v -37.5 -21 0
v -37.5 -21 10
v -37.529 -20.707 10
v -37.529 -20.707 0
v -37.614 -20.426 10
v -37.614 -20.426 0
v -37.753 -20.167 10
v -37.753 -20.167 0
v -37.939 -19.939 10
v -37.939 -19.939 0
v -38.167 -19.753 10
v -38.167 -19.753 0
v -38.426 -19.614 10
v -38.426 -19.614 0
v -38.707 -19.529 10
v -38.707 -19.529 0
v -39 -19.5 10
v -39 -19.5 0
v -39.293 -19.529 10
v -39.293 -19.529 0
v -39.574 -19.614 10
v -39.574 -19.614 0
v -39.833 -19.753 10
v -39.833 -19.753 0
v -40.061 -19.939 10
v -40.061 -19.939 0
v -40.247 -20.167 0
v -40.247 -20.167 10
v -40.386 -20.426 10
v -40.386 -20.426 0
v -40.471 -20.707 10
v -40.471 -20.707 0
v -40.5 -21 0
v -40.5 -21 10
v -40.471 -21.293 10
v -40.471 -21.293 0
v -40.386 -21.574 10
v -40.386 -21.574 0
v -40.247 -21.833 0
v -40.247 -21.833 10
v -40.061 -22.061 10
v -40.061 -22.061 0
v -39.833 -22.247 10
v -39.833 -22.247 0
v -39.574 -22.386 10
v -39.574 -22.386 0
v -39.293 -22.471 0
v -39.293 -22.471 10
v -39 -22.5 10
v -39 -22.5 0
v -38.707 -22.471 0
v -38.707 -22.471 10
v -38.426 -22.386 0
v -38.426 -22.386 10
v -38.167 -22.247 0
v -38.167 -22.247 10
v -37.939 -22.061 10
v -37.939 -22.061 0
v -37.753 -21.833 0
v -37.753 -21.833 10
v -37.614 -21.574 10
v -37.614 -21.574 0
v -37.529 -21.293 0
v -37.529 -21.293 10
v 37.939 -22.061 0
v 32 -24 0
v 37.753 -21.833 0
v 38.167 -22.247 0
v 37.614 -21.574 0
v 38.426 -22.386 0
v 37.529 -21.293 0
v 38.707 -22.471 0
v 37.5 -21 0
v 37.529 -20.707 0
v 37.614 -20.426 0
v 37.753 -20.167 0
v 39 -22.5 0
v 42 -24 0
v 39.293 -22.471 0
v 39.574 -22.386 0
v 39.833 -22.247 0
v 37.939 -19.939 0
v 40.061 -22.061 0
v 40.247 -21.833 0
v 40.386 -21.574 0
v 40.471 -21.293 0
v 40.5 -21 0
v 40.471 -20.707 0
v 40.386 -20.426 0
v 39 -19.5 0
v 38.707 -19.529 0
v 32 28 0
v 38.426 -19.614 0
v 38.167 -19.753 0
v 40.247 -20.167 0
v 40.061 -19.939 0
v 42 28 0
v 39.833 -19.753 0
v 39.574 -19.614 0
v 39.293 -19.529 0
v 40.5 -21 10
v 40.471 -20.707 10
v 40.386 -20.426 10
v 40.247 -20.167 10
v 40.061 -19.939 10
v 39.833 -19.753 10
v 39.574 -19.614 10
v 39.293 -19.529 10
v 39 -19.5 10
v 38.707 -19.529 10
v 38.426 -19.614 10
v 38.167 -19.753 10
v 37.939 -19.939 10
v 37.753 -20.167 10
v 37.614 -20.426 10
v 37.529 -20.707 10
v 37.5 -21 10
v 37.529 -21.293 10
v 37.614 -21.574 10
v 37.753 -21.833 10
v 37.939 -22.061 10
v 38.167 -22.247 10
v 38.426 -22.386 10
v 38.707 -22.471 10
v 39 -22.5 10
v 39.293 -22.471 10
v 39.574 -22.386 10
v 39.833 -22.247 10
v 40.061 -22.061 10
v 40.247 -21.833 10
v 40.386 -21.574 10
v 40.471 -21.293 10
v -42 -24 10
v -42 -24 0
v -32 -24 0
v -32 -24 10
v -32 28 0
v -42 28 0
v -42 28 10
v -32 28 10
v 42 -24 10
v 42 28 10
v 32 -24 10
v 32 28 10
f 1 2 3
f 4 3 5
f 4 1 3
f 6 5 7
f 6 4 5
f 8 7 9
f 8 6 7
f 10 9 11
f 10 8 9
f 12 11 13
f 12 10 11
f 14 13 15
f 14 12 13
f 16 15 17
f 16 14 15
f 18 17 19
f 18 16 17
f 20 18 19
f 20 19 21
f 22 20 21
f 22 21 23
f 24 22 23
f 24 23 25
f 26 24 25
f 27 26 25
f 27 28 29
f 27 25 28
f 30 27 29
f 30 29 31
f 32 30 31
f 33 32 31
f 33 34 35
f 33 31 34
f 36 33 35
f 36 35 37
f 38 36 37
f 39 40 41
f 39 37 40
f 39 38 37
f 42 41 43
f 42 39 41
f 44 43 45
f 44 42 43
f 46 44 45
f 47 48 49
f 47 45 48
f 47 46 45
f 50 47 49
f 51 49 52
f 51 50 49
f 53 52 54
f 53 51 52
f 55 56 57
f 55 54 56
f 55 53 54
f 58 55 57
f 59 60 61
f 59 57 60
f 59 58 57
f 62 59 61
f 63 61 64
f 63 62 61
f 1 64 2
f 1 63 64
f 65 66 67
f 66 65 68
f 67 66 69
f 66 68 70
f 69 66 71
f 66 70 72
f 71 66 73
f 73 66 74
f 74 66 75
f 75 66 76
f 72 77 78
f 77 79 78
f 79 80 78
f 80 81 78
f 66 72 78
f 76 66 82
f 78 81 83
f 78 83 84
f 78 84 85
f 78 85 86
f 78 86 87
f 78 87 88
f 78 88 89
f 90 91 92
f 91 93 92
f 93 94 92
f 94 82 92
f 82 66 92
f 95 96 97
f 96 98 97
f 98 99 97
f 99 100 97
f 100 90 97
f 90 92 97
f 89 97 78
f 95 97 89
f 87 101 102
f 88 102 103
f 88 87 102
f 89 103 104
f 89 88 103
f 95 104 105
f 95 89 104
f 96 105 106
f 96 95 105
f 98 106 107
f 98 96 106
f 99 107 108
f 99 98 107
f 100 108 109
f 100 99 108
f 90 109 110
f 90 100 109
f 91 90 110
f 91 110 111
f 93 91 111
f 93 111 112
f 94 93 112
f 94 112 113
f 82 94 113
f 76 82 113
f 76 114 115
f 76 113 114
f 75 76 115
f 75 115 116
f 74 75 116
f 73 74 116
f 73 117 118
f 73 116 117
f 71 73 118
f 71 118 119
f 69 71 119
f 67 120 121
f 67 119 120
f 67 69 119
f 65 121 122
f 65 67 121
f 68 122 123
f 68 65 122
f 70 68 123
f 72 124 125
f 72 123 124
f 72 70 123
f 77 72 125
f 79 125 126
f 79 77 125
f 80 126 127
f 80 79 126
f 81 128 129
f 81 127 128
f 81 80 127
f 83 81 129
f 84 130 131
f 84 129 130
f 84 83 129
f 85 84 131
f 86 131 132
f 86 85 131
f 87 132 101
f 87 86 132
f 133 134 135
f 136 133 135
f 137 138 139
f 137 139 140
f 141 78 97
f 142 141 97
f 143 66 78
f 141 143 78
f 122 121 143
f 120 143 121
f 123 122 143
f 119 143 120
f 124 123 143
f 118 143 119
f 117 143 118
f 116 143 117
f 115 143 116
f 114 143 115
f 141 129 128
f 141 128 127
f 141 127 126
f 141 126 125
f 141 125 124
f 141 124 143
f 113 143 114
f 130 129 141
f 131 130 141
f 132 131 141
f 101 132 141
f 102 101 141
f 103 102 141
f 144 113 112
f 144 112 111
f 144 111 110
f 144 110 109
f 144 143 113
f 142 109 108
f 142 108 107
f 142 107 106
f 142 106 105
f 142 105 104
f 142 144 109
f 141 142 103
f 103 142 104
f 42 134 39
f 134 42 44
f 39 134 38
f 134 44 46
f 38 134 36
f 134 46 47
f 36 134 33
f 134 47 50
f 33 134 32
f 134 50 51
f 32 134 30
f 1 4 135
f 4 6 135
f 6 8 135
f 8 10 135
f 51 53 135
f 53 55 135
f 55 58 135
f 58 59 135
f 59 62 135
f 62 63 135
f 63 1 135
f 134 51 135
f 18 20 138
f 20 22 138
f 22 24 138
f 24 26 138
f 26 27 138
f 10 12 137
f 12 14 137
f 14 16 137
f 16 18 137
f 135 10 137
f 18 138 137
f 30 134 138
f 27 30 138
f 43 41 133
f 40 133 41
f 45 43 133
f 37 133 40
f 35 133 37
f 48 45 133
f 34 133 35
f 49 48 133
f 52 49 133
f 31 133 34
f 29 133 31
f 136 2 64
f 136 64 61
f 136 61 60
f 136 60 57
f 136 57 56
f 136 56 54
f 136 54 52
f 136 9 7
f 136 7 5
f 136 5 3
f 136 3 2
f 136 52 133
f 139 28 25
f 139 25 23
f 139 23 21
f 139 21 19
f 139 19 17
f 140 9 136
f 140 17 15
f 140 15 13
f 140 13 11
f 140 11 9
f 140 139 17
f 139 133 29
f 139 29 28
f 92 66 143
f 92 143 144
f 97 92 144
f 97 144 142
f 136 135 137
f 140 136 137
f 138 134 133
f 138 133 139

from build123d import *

# Parameters (mm, degrees)
CYLINDER533_R     = 1.5
CYLINDER533_DEPTH = 100
CYLINDER532_R     = 1.5
CYLINDER532_DEPTH = 100
BOX137_W          = 10
BOX137_H          = 52
BOX137_DEPTH      = 10
BOX136_W          = 10
BOX136_H          = 52
BOX136_DEPTH      = 10


with BuildPart() as v_lec533:
    # Cylinder533 → Cylinder533 (new body)
    with BuildSketch(Plane(origin=(39, -21, 0), x_dir=(1, 0, 0), z_dir=(0, 0, 1))):
        Circle(CYLINDER533_R)
    extrude(amount=CYLINDER533_DEPTH)


with BuildPart() as compound321:
    # Cylinder532 → Cylinder532 (new body)
    with BuildSketch(Plane(origin=(-39, -21, 0), x_dir=(1, 0, 0), z_dir=(0, 0, 1))):
        Circle(CYLINDER532_R)
    extrude(amount=CYLINDER532_DEPTH)

    # Compound321: union Válec533
    add(v_lec533.part)


with BuildPart() as krychle137:
    # Box137 → Box137 (new body)
    with BuildSketch(Plane(origin=(-42, -24, 0), x_dir=(1, 0, 0), z_dir=(0, 0, 1))):
        with Locations((5, 26)):
            Rectangle(BOX137_W, BOX137_H)
    extrude(amount=BOX137_DEPTH)


with BuildPart() as cut:
    # Box136 → Box136 (new body)
    with BuildSketch(Plane(origin=(32, -24, 0), x_dir=(1, 0, 0), z_dir=(0, 0, 1))):
        with Locations((5, 26)):
            Rectangle(BOX136_W, BOX136_H)
    extrude(amount=BOX136_DEPTH)

    # Compound: union Krychle137
    add(krychle137.part)

    # Cut: cut Compound321
    add(compound321.part, mode=Mode.SUBTRACT)


solid = cut.part
